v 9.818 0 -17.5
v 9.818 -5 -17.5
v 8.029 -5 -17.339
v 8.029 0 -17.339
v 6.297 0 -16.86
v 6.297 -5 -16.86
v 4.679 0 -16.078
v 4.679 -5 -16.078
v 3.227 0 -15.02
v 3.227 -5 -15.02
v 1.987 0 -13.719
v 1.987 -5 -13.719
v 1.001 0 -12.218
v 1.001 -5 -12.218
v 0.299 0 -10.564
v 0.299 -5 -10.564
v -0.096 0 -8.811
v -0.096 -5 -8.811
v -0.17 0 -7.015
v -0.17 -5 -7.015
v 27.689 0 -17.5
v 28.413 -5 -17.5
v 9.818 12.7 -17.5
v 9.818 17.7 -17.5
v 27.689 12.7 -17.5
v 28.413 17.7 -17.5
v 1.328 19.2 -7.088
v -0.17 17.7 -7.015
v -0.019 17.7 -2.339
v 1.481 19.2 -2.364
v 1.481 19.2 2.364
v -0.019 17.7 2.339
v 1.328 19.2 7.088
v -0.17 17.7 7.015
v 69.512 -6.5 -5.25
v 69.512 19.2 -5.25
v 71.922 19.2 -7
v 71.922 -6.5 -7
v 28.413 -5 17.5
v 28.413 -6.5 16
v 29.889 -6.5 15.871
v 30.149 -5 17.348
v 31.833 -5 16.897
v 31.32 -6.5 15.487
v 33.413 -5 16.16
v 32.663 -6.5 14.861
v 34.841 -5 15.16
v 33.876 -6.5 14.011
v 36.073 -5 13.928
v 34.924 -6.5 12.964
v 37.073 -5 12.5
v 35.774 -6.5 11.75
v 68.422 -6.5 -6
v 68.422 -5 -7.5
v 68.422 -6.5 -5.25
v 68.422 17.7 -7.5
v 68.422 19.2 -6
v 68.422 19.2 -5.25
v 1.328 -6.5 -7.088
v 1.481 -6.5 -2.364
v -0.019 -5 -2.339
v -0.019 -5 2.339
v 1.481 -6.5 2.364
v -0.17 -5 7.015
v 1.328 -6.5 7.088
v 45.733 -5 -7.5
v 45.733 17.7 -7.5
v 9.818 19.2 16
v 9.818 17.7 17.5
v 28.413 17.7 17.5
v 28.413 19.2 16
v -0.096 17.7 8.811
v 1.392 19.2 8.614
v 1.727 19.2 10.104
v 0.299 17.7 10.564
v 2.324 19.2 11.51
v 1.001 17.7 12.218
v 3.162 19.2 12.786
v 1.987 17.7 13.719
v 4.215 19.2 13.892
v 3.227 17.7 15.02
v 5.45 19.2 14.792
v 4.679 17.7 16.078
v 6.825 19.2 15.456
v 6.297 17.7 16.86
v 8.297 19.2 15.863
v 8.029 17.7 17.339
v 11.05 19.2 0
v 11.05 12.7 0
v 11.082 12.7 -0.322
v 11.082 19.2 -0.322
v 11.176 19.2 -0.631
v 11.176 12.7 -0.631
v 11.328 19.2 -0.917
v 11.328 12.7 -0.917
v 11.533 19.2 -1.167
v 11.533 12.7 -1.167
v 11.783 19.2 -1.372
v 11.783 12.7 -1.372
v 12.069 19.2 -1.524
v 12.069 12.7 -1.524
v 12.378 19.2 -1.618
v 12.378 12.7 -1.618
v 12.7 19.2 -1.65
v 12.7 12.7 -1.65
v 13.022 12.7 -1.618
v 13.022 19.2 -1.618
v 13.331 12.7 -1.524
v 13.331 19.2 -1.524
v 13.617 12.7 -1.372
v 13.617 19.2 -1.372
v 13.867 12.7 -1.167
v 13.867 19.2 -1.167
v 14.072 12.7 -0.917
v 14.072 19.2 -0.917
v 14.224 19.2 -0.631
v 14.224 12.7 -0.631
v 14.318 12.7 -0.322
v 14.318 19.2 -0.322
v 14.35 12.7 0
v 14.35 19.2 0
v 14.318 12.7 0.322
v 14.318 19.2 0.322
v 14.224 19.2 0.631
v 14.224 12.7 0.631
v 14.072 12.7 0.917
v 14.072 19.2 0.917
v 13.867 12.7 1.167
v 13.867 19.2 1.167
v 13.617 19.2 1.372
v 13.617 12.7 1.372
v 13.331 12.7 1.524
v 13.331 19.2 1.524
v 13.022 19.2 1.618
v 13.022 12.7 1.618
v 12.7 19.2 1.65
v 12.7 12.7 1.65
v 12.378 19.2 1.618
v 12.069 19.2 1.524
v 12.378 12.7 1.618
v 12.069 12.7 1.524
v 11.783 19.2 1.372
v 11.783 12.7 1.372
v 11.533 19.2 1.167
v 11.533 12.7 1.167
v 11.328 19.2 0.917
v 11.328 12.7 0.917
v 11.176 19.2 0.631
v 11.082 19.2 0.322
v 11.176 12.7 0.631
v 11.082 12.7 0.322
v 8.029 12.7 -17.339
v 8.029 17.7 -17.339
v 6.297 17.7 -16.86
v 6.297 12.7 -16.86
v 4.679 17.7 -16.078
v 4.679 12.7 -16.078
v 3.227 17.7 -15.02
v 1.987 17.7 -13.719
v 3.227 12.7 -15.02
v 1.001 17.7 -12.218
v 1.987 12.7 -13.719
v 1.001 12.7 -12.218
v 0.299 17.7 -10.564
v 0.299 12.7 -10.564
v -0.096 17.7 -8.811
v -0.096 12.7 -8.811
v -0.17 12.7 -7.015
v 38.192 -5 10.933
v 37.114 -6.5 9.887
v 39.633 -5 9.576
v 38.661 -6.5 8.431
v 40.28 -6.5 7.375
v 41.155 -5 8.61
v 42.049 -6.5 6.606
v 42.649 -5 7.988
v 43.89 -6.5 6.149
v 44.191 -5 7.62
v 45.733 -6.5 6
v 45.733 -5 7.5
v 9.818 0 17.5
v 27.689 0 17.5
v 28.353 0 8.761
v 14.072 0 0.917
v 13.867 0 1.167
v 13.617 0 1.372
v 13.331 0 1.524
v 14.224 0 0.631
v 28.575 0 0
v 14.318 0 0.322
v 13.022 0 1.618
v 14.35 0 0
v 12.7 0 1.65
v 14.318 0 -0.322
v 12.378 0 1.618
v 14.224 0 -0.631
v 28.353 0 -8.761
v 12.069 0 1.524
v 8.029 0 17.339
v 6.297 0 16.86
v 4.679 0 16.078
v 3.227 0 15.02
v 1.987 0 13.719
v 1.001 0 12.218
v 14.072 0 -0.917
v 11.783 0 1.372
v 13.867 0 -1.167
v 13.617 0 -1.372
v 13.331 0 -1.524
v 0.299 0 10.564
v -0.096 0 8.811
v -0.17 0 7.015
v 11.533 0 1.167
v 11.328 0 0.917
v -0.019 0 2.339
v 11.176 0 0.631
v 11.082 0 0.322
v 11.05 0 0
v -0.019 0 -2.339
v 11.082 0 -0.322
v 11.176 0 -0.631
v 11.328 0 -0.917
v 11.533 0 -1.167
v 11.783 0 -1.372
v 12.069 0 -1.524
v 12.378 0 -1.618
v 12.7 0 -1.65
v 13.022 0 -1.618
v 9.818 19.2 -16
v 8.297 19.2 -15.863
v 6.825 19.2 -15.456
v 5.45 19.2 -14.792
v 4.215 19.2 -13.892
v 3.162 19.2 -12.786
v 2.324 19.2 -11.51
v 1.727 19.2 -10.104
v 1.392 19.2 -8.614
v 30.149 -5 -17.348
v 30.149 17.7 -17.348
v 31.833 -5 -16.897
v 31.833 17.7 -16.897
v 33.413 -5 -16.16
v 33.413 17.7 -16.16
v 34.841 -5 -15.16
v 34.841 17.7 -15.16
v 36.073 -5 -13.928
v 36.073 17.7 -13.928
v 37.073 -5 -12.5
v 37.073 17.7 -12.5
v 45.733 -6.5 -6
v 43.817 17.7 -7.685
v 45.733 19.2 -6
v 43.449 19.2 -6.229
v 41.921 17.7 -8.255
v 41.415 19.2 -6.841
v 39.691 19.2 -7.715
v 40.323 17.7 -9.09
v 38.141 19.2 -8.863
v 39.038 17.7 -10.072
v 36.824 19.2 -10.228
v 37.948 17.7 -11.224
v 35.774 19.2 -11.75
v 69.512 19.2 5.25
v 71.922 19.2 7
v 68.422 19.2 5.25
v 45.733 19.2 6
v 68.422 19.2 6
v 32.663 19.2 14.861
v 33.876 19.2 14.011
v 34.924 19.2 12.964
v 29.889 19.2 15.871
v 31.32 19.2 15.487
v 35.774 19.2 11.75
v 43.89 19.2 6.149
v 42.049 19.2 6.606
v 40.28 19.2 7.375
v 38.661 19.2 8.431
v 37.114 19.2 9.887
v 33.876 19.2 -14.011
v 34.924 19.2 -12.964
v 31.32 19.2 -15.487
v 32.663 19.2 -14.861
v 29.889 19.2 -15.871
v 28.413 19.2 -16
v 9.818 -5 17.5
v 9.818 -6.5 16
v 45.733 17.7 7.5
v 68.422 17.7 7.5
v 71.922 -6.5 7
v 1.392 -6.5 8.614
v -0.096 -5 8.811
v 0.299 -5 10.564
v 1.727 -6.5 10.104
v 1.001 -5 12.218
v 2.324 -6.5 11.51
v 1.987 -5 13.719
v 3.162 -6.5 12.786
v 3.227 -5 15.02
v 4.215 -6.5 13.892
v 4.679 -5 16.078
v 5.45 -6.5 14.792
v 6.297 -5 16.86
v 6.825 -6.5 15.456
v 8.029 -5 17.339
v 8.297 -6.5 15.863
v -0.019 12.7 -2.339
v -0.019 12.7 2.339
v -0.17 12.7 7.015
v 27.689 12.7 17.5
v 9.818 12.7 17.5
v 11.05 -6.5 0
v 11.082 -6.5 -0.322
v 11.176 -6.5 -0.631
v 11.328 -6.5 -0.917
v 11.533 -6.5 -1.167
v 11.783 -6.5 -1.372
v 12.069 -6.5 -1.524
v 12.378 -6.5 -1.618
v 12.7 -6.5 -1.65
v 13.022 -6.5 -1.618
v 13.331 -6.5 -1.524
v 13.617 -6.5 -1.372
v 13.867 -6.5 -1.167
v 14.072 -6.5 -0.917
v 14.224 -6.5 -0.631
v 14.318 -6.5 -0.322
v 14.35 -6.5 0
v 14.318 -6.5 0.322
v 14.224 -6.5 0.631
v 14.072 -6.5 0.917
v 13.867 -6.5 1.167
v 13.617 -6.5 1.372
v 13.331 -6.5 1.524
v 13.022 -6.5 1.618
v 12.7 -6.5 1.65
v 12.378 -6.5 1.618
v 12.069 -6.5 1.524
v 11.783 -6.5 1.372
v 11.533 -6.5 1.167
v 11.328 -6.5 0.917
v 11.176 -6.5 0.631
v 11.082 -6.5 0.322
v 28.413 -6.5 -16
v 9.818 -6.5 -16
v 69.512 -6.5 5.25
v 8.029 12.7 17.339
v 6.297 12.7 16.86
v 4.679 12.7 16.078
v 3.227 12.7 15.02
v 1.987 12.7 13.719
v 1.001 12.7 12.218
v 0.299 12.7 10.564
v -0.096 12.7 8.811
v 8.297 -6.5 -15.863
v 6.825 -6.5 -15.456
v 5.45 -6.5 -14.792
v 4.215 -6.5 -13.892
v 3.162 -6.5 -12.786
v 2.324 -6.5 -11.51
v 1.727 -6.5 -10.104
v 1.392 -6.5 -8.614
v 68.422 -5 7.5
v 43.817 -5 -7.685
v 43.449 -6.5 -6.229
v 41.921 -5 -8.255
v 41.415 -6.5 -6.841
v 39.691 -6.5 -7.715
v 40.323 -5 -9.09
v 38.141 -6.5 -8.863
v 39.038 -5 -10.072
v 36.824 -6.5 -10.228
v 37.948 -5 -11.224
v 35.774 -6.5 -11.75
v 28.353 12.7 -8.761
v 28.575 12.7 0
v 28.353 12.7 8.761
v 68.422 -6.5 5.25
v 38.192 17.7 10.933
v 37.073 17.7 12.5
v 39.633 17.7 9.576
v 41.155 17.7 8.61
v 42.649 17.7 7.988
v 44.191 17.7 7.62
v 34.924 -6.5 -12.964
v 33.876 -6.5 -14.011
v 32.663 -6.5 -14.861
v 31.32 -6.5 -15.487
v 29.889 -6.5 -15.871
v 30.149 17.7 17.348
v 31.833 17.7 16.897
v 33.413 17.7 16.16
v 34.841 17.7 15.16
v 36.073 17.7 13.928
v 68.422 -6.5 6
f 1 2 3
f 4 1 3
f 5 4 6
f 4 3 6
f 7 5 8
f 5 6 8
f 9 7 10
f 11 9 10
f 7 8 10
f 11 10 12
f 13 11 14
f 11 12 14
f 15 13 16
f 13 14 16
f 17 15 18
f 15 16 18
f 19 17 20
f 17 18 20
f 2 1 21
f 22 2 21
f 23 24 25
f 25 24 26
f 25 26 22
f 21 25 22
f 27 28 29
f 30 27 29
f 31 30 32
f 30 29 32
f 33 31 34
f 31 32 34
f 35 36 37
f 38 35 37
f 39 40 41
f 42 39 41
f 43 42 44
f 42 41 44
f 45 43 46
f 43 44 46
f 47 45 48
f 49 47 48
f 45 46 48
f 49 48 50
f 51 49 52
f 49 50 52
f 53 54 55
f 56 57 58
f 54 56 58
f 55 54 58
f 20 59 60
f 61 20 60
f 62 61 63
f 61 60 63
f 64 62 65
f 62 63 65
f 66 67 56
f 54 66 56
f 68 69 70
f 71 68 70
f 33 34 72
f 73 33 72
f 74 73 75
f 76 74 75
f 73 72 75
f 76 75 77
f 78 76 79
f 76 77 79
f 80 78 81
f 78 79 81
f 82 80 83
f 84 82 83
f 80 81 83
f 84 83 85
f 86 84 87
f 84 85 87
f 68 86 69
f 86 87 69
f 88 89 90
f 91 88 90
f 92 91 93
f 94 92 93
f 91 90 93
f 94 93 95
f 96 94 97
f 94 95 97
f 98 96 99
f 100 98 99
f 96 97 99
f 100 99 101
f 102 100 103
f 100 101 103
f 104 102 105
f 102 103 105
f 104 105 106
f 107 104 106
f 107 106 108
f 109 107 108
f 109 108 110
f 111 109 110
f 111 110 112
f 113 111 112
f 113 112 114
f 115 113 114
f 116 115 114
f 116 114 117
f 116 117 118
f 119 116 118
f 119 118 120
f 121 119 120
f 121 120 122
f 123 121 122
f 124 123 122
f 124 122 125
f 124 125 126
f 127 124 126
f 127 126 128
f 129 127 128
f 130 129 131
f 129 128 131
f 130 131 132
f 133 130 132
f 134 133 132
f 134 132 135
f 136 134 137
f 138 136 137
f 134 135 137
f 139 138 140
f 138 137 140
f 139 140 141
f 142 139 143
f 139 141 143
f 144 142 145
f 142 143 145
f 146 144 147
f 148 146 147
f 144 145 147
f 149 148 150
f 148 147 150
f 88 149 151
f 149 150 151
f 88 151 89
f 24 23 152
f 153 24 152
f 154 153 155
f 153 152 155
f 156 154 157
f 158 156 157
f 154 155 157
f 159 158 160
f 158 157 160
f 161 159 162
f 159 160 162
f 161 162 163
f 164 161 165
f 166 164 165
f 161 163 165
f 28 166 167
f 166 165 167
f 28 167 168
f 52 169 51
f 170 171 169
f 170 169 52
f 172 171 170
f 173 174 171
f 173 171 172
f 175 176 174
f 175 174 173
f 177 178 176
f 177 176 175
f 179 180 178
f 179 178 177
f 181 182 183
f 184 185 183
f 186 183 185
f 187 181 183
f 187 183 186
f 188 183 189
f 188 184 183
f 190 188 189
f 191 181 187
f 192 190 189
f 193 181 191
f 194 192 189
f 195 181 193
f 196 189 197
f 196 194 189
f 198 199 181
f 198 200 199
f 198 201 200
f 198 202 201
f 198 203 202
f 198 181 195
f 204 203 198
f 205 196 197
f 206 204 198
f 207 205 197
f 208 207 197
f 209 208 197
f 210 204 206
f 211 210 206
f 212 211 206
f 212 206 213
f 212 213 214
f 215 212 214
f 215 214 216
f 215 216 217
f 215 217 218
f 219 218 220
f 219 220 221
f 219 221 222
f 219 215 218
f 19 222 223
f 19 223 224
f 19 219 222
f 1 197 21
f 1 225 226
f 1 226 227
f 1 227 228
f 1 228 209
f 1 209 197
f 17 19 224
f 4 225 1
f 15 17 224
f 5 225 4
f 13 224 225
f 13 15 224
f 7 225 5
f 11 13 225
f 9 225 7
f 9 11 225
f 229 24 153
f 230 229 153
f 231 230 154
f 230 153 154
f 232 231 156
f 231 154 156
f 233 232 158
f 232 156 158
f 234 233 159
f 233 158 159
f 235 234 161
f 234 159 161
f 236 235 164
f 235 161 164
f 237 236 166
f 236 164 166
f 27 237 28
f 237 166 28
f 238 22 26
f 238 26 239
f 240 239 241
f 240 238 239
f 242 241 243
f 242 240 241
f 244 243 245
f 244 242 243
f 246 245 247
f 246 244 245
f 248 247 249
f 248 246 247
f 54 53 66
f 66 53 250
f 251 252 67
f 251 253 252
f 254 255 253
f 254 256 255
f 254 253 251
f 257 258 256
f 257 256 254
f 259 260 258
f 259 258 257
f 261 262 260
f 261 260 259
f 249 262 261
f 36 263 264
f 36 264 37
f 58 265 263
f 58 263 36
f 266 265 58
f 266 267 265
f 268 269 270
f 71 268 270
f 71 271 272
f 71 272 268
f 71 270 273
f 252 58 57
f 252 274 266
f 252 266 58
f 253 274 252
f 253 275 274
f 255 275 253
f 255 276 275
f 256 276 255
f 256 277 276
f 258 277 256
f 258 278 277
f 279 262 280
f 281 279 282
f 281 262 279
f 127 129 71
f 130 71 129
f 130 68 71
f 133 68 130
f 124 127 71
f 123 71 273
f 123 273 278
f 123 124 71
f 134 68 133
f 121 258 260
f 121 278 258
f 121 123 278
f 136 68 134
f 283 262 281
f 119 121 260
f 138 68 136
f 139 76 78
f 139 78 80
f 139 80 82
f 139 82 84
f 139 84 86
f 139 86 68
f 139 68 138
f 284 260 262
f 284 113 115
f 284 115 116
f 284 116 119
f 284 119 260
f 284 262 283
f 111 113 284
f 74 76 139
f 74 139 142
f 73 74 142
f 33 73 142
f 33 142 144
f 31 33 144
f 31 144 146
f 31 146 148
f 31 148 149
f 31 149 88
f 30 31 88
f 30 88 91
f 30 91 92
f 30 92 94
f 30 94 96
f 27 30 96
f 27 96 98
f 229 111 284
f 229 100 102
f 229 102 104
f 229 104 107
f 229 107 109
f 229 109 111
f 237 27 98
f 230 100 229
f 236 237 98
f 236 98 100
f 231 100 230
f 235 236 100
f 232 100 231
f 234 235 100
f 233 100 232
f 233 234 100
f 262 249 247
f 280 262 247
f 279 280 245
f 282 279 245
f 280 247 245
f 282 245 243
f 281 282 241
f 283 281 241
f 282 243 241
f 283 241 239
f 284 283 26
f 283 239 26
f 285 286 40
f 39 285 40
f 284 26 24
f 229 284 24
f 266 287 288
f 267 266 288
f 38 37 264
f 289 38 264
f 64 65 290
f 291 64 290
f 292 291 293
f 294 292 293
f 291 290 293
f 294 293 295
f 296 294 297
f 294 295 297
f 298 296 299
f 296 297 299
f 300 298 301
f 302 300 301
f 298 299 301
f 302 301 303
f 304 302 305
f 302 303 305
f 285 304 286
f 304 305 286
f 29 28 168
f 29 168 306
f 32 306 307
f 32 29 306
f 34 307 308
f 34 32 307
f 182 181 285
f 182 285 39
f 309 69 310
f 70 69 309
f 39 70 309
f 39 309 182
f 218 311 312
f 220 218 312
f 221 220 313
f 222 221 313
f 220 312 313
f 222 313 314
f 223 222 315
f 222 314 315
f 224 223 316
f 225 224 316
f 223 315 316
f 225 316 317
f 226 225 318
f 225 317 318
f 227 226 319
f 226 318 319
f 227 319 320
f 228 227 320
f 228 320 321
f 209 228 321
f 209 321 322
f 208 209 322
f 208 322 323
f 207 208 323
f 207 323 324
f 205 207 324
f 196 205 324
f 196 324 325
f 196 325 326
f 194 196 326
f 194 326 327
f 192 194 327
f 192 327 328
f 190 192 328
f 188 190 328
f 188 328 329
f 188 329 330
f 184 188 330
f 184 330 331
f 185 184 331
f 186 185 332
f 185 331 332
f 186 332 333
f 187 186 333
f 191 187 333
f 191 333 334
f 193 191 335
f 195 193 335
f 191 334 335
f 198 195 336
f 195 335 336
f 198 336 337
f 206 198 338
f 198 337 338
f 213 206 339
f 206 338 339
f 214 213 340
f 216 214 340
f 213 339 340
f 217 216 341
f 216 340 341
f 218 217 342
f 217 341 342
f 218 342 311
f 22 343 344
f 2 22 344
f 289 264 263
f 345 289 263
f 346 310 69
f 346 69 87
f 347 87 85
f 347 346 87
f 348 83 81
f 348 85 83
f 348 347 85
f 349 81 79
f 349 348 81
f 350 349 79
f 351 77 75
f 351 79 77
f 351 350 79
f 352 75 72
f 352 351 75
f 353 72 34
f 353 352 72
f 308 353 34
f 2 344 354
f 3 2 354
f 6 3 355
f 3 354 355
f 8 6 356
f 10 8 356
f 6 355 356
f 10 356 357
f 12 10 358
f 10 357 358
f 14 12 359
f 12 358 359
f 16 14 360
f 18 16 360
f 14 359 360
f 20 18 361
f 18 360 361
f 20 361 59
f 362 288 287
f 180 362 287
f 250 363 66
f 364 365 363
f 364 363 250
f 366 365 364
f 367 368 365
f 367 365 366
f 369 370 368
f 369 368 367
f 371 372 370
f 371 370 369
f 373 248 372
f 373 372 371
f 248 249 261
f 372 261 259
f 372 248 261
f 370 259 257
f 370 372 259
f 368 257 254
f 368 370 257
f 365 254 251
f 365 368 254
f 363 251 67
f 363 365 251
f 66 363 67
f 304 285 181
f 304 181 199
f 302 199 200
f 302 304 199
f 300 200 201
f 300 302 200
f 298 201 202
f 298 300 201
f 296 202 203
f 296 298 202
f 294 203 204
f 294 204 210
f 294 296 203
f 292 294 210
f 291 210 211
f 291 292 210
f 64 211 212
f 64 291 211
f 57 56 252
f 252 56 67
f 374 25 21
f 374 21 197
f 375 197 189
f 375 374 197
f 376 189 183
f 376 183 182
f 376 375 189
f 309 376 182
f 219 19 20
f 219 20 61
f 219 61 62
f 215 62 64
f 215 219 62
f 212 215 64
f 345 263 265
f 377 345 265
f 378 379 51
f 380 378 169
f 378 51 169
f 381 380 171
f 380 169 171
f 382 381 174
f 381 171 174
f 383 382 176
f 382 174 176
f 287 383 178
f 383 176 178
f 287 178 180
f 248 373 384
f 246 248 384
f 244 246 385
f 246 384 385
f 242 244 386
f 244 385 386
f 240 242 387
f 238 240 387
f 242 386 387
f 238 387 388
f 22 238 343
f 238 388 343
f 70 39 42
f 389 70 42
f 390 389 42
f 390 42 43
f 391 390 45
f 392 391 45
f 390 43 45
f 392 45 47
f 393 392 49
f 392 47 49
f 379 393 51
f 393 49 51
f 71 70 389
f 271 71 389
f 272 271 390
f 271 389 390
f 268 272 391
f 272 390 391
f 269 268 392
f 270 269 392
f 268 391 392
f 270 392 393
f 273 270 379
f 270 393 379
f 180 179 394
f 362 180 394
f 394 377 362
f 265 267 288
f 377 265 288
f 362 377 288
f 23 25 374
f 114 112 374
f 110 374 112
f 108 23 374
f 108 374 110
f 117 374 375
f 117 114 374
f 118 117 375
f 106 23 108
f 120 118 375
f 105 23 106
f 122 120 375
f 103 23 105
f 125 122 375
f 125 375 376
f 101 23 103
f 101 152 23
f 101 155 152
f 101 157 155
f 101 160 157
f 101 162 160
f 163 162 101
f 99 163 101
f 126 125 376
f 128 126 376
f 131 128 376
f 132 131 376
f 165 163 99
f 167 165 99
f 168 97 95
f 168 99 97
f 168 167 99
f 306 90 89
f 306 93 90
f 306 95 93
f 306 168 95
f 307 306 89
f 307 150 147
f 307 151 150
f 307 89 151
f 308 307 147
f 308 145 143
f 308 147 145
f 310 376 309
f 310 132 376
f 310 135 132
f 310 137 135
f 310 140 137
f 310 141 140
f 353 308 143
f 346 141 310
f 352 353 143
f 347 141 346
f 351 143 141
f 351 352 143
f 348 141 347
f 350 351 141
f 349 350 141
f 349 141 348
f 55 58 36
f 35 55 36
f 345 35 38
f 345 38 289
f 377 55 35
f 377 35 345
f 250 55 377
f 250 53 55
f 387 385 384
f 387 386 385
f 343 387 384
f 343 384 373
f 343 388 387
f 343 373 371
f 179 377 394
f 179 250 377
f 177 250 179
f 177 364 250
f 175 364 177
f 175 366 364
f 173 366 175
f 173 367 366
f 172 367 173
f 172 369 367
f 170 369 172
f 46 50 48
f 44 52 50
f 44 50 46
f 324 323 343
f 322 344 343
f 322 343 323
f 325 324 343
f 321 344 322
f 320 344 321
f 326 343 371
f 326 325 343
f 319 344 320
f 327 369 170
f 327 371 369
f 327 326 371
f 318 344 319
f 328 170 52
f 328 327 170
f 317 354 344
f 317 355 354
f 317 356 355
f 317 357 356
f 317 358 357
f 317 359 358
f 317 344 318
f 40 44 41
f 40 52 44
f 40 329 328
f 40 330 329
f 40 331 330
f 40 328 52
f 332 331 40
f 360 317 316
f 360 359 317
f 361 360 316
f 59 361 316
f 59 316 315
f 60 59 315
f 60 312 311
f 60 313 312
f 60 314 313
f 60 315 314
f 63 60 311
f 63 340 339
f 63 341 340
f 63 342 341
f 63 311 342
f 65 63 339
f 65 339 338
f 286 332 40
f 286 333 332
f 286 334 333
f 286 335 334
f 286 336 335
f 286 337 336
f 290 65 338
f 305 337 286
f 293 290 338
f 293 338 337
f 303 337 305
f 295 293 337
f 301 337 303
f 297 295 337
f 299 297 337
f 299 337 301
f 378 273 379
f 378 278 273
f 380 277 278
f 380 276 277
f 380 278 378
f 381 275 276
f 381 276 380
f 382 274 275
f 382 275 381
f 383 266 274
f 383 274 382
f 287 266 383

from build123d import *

# Parameters (mm, degrees)
SKETCH2_OUTSIDE_W     = 472.576
SKETCH2_OUTSIDE_H     = 472.576
SKETCH2_OUTSIDE_W_2   = 39.636477918
SKETCH2_OUTSIDE_H_2   = 35
CUT_EXTRUDE1_DEPTH    = 377.781288533
BOSS_EXTRUDE1_DEPTH   = 25.7
BOSS_EXTRUDE2_DEPTH   = 25.7
FILLET1_R             = 10
M4X0_7_TAPPED_HOLE1_D = 3.3
FILLET2_R             = 10
CHAMFER1_SIZE         = 1.5


with BuildPart() as part:
    # Sketch1 → Revolve1 (revolve)
    with BuildSketch(Plane.XY, mode=Mode.PRIVATE) as revolve1_sk:
        Polygon((0, 0), (28.575, 0), (28.575, 12.7), (0, 12.7), (0, 19.2), (38.575, 19.2), (38.575, -6.5), (0, -6.5), align=None)
    revolve(revolve1_sk.sketch.rotate(Axis((-144.78715491, 19.2, 0), (0, -1, 0)), 90), axis=Axis((-144.78715491, 19.2, 0), (0, -1, 0)))

    # Sketch2 outside → Cut-Extrude1 (cut, through all)
    with BuildSketch(Plane(origin=(0, 19.2, 0), x_dir=(1, 0, 0), z_dir=(0, 1, 0))):
        with Locations((-144.787, 0)):
            Rectangle(SKETCH2_OUTSIDE_W, SKETCH2_OUTSIDE_H)
        with Locations((18.756761041, 0)):
            Rectangle(SKETCH2_OUTSIDE_W_2, SKETCH2_OUTSIDE_H_2, mode=Mode.SUBTRACT)
    extrude(amount=-CUT_EXTRUDE1_DEPTH, mode=Mode.SUBTRACT)

    # Sketch3 → Boss-Extrude1 (add, through all)
    with BuildSketch(Plane(origin=(0, 19.2, 0), x_dir=(1, 0, 0), z_dir=(0, 1, 0))):
        with BuildLine():
            Line((38.421550814, 7.5), (68.421550814, 7.5))
            Line((68.421550814, 7.5), (68.421550814, -7.5))
            Line((68.421550814, -7.5), (38.421550814, -7.5))
            ThreePointArc((38.421550814, -7.5), (38.575, 0), (38.421550814, 7.5))
        make_face()
    extrude(amount=-BOSS_EXTRUDE1_DEPTH)

    # Sketch4 → Boss-Extrude2 (add, through all)
    with BuildSketch(Plane(origin=(0, 19.2, 0), x_dir=(1, 0, 0), z_dir=(0, 1, 0))):
        Polygon((71.921550814, 7), (71.921550814, -7), (69.511550814, -5.25), (68.421550814, -5.25), (68.421550814, 5.25), (69.511550814, 5.25), align=None)
    extrude(amount=-BOSS_EXTRUDE2_DEPTH)

    # Fillet1
    fillet1_edges = [part.edges().sort_by_distance(p)[0] for p in [
        (-1.061477918, 15.95, 17.5),
        (-1.061477918, -3.25, 17.5),
        (-1.061477918, -3.25, -17.5),
        (-1.061477918, 15.95, -17.5),
        (37.73799364, 6.35, -17.5),
        (37.73799364, 6.35, 17.5),
    ]]
    fillet(fillet1_edges, radius=FILLET1_R)

    # M4x0.7 Tapped Hole1 (through all)
    with Locations(Plane(origin=(0, 19.2, 0), x_dir=(1, 0, 0), z_dir=(0, 1, 0))):
        with Locations((12.7, 0)):
            Hole(M4X0_7_TAPPED_HOLE1_D / 2)

    # Fillet2
    fillet2_edges = [part.edges().sort_by_distance(p)[0] for p in [
        (38.421550814, 6.35, 7.5),
        (38.421550814, 6.35, -7.5),
    ]]
    fillet(fillet2_edges, radius=FILLET2_R)

    # Chamfer1
    chamfer1_edges = [part.edges().sort_by_distance(p)[0] for p in [
        (19.115441742, 19.2, 17.5),
        (2.577841169, 19.2, 14.397631358),
        (2.577841169, 19.2, -14.397631358),
        (33.41269138, 19.2, 16.160254038),
        (33.41269138, -6.5, 16.160254038),
        (57.077375135, 19.2, 7.5),
        (57.077375135, -6.5, 7.5),
        (33.41269138, 19.2, -16.160254038),
        (40.733199456, 19.2, 8.839745962),
        (40.733199456, -6.5, 8.839745962),
        (40.733199456, 19.2, -8.839745962),
        (40.733199456, -6.5, -8.839745962),
        (57.077375135, -6.5, -7.5),
        (57.077375135, 19.2, -7.5),
        (19.115441742, 19.2, -17.5),
        (19.115441742, -6.5, -17.5),
        (19.115441742, -6.5, 17.5),
        (0, -6.5, 0),
        (2.577841169, -6.5, 14.397631358),
        (2.577841169, -6.5, -14.397631358),
        (33.41269138, -6.5, -16.160254038),
        (0, 19.2, 0),
    ]]
    chamfer(chamfer1_edges, length=CHAMFER1_SIZE)


solid = part.part
